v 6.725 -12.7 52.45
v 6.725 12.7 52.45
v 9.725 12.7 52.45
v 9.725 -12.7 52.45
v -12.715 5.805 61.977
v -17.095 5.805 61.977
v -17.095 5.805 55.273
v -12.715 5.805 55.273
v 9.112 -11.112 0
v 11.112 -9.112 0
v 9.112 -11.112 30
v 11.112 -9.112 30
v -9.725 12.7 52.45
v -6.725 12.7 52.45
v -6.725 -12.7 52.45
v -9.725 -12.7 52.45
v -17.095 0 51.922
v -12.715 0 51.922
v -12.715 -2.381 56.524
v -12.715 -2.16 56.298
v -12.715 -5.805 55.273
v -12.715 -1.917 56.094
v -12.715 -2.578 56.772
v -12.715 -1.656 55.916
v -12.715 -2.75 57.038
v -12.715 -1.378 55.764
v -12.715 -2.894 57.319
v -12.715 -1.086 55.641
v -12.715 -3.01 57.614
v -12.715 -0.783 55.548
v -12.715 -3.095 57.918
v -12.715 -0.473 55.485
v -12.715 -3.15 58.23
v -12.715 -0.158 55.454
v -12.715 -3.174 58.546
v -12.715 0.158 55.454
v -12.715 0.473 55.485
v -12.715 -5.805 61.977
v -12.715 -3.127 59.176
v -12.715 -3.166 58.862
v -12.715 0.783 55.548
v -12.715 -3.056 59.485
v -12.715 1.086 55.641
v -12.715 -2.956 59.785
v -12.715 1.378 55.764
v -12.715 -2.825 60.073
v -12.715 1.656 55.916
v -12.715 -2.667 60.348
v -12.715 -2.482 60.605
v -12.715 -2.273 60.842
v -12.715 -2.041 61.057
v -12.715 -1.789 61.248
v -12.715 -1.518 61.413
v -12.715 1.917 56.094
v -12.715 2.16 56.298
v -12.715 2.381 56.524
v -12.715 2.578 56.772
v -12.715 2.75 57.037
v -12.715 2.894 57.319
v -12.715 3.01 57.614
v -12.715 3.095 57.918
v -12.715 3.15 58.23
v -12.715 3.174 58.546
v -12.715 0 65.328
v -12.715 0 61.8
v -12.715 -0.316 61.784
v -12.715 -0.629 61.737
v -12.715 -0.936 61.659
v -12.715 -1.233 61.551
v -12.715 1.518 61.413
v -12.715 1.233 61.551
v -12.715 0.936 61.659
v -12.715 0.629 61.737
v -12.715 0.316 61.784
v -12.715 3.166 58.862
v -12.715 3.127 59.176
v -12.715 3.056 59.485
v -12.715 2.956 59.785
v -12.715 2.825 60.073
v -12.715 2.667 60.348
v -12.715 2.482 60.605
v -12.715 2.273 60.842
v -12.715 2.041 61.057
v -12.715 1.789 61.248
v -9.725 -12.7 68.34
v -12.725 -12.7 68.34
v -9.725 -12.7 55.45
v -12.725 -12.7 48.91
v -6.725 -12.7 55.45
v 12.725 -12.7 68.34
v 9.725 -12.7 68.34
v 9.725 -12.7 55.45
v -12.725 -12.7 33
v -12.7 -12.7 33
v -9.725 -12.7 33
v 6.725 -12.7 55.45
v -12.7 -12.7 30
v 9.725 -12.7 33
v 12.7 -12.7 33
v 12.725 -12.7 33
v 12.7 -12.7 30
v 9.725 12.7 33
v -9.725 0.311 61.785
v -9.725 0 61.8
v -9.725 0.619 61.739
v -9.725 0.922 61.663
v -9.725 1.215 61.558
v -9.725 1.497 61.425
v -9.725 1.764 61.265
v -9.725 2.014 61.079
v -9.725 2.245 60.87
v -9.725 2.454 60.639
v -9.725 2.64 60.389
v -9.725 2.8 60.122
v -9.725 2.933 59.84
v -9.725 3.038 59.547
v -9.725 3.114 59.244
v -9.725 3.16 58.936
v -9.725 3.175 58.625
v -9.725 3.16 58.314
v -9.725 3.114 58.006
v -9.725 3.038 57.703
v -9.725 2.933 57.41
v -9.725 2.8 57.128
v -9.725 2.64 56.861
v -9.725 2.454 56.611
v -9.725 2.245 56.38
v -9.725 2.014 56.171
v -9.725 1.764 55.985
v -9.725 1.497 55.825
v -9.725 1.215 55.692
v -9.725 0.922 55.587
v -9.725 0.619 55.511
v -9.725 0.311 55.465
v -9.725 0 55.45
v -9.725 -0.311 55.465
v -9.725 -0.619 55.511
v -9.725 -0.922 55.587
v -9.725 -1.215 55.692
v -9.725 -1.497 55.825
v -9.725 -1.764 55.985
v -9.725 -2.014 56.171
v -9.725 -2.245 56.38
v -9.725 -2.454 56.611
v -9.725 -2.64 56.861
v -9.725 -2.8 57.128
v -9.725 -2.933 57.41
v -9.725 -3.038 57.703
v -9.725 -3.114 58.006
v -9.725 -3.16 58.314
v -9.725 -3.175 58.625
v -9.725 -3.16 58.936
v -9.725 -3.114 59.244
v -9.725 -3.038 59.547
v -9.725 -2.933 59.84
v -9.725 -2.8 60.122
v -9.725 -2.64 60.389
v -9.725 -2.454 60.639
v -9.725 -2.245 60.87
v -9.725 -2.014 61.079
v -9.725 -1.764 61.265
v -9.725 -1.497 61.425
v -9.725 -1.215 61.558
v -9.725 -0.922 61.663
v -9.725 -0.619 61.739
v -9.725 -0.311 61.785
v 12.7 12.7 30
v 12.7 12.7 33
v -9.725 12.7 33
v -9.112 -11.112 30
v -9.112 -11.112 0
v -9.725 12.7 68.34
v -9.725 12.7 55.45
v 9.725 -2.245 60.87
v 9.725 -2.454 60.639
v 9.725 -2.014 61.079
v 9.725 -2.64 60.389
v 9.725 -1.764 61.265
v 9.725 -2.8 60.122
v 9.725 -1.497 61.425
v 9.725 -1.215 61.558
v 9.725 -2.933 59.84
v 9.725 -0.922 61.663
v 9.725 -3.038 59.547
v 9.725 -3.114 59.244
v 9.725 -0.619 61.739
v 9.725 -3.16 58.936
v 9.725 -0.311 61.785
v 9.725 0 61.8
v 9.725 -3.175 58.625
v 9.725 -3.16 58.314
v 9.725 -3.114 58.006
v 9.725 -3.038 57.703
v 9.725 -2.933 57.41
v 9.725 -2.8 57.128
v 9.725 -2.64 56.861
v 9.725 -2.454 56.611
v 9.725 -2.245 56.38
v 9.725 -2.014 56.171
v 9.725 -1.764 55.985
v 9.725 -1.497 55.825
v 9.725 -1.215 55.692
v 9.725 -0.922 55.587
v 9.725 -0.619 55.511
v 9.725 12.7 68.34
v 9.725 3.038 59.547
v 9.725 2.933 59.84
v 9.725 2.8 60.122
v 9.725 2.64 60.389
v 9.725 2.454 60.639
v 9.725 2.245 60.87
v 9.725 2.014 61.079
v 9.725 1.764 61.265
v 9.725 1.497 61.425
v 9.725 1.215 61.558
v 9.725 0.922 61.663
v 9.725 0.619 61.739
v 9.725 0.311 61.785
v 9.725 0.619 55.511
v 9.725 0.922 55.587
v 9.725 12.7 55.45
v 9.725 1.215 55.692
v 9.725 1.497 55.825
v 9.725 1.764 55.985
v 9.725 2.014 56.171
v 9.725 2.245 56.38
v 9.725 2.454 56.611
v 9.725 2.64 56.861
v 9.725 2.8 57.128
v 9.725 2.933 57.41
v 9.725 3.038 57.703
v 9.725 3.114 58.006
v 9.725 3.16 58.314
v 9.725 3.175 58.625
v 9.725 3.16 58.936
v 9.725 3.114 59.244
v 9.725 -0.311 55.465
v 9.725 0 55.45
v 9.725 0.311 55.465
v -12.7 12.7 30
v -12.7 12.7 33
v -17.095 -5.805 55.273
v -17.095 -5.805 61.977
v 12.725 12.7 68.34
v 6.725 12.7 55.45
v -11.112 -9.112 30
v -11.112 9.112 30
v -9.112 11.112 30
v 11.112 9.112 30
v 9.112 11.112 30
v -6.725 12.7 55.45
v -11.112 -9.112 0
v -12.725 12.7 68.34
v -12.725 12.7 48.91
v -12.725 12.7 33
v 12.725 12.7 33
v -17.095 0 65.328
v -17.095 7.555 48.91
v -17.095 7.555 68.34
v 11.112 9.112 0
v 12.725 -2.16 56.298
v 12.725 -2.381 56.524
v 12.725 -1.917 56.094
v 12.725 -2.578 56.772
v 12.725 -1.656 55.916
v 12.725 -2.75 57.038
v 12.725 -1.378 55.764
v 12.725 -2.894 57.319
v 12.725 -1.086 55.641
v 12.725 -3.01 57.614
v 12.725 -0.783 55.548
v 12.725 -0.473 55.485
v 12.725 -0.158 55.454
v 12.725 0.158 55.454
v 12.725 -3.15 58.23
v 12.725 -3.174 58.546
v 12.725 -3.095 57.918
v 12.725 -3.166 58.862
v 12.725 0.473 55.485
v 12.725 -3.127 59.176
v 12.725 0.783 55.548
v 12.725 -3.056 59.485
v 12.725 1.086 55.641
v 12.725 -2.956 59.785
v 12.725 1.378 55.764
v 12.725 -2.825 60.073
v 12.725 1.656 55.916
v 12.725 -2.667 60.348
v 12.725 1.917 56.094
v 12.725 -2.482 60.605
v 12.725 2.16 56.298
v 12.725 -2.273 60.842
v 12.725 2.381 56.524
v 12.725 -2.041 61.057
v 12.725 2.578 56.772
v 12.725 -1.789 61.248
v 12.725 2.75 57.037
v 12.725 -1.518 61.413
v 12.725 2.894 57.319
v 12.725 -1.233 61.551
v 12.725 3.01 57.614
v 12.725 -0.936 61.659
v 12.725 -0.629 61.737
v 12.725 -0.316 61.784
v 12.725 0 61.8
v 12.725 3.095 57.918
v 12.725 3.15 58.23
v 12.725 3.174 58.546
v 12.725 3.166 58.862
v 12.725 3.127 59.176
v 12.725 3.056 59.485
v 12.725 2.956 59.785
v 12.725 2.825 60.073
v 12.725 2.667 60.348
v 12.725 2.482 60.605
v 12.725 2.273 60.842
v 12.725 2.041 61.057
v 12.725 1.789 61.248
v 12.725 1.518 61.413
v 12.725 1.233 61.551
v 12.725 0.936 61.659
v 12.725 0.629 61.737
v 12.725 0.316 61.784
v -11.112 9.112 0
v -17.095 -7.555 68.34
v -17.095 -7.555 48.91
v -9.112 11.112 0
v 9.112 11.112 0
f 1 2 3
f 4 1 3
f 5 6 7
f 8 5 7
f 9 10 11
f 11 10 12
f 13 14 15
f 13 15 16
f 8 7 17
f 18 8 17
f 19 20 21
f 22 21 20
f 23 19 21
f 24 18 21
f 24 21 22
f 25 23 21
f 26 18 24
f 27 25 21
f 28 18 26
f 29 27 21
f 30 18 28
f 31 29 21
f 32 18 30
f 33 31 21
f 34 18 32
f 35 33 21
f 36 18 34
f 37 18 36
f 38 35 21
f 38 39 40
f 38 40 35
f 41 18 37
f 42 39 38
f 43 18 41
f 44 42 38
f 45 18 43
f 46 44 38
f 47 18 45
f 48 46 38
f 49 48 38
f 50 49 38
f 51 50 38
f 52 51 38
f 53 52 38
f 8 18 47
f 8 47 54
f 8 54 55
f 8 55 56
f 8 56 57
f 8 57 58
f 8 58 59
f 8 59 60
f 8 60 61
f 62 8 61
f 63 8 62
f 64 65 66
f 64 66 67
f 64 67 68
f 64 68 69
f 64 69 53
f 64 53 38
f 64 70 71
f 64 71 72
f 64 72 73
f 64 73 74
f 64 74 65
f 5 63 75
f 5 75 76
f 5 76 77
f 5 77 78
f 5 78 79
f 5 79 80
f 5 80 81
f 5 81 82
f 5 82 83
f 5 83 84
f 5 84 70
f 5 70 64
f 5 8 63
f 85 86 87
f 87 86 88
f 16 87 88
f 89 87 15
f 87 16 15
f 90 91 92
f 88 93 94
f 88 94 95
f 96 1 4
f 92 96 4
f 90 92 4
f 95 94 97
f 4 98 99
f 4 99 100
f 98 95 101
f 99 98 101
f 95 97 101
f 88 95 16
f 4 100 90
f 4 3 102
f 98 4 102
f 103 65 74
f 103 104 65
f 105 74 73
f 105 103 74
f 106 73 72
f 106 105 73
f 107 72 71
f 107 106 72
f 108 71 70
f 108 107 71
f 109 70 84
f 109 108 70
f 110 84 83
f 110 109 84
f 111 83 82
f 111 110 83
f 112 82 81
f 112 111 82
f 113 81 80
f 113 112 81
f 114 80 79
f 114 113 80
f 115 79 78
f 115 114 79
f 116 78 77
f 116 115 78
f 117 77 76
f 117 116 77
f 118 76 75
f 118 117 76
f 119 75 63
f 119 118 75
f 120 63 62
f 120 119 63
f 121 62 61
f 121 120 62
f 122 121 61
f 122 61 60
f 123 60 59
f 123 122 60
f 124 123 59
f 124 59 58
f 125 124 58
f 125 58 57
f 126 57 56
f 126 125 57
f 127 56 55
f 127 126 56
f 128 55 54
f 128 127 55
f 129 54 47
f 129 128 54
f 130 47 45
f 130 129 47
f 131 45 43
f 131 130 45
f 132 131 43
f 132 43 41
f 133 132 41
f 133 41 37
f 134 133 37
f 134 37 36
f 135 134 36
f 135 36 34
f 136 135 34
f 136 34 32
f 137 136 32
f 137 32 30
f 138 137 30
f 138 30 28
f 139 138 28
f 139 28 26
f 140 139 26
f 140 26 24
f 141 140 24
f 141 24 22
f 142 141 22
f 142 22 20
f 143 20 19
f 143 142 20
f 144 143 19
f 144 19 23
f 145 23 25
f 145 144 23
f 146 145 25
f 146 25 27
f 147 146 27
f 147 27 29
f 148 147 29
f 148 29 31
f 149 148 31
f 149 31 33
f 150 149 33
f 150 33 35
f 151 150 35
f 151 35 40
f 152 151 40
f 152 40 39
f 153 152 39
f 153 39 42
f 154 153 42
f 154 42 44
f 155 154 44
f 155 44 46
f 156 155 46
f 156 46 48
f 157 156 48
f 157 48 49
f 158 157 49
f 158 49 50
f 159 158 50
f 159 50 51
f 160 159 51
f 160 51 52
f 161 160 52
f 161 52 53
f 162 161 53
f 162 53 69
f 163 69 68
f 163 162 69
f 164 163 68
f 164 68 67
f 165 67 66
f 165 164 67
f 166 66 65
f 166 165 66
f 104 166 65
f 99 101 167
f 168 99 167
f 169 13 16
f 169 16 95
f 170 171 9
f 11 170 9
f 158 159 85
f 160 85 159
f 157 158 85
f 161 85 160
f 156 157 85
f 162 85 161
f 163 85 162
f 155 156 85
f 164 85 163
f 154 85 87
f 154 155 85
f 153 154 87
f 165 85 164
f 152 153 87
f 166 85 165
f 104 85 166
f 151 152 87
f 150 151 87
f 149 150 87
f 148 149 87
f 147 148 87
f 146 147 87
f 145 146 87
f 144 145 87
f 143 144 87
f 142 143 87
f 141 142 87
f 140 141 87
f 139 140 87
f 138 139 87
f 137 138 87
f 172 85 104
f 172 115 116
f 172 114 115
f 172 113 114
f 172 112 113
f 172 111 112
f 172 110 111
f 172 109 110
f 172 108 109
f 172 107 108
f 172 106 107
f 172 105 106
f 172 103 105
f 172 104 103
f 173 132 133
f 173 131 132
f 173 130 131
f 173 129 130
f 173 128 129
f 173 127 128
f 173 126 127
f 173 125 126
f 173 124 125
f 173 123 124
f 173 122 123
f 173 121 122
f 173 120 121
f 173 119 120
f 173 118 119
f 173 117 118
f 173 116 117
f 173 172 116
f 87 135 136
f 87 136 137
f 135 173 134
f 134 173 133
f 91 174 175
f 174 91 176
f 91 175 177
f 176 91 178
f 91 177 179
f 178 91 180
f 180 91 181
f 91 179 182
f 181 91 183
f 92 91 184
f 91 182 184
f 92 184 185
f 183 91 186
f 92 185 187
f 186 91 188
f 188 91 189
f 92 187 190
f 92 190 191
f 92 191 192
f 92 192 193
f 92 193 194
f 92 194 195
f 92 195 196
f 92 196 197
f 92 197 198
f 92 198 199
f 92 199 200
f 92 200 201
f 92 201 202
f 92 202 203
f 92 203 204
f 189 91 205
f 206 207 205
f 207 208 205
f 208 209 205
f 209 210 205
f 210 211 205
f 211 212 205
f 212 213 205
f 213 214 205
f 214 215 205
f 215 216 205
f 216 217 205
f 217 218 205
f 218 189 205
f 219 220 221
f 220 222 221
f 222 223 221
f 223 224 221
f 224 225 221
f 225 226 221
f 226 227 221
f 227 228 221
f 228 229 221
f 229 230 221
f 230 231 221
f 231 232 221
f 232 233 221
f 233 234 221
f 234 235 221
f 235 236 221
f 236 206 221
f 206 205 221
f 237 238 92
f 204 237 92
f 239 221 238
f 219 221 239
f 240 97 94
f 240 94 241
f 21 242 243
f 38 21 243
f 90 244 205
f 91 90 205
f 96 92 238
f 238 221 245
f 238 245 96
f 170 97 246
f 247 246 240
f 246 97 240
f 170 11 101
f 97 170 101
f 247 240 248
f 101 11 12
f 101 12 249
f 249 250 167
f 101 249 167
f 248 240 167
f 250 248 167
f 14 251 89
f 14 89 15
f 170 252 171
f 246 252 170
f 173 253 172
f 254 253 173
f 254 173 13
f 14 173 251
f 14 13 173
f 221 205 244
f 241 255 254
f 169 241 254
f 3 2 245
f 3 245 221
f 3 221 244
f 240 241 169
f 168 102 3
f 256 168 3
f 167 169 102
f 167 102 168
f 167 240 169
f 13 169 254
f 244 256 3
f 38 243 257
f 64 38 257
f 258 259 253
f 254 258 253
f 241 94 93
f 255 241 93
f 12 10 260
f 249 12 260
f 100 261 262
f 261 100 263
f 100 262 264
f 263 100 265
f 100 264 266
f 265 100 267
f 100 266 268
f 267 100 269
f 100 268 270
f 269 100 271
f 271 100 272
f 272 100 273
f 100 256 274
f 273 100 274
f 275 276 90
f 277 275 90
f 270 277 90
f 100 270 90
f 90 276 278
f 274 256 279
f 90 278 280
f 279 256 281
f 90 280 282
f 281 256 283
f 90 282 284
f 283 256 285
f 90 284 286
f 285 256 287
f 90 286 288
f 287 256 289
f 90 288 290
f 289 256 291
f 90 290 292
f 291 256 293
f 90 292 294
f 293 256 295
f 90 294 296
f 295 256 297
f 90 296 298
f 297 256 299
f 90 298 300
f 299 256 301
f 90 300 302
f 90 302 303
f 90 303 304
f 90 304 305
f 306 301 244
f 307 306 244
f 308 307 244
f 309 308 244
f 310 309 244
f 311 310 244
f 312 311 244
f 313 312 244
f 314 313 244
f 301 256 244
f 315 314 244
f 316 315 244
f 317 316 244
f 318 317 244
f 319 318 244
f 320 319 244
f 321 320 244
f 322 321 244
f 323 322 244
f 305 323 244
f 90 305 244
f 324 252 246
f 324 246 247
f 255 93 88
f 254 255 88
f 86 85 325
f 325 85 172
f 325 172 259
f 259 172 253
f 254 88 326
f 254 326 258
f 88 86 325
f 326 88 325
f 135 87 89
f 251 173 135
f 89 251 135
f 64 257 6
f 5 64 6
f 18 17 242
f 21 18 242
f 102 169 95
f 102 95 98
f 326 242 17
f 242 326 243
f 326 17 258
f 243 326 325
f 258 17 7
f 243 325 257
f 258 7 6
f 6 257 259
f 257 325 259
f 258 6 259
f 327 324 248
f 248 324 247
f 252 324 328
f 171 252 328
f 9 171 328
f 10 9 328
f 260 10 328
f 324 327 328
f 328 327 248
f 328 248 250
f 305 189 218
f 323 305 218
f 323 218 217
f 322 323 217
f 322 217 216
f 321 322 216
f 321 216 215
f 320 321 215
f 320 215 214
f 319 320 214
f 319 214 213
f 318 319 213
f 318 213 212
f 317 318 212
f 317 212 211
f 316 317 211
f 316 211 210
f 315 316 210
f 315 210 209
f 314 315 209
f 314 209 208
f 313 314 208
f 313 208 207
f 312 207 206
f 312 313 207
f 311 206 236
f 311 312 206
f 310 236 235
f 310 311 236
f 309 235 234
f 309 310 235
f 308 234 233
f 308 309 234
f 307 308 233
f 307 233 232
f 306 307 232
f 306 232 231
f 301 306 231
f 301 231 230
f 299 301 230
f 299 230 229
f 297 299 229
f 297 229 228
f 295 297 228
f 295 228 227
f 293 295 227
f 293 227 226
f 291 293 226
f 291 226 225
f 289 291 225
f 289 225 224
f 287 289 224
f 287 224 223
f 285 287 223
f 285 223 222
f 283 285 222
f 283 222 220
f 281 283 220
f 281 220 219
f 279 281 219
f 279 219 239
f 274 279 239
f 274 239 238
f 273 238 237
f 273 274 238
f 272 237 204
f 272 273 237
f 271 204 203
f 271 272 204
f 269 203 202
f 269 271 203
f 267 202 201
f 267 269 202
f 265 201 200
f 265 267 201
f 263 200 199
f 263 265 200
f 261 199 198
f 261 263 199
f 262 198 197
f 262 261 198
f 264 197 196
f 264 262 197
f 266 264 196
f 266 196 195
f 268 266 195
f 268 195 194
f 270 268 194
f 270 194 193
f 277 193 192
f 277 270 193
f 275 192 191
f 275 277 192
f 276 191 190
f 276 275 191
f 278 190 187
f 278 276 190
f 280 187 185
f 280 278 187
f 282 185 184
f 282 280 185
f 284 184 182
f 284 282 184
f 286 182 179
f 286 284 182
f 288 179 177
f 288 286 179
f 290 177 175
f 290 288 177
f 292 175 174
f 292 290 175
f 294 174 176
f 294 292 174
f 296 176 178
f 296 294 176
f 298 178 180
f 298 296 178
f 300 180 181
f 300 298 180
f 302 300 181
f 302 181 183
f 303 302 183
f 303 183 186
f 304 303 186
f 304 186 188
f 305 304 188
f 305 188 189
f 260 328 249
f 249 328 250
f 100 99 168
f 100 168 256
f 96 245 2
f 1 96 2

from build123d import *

# Parameters (mm, degrees)
SKETCH1_W               = 22.225
SKETCH1_H               = 22.225
BOSS_EXTRUDE1_DEPTH     = 30
SKETCH3_W               = 25.4
SKETCH3_H               = 25.4
BOSS_EXTRUDE2_DEPTH     = 3
BOSS_EXTRUDE3_DEPTH     = 25.4
BOSS_EXTRUDE4_DEPTH     = 19.43
CUT_EXTRUDE1_DEPTH      = 75.504751526
CUT_EXTRUDE1_DEPTH_BACK = 75.504751526
SKETCH5_R               = 3.175
CUT_EXTRUDE2_DEPTH      = 4.38
CHAMFER1_SIZE           = 2


with BuildPart() as part:
    # Sketch1 → Boss-Extrude1 (new body)
    with BuildSketch(Plane.XY):
        Rectangle(SKETCH1_W, SKETCH1_H)
    extrude(amount=BOSS_EXTRUDE1_DEPTH)

    # Sketch3 → Boss-Extrude2 (add)
    with BuildSketch(Plane.XY.offset(30)):
        Rectangle(SKETCH3_W, SKETCH3_H)
    extrude(amount=BOSS_EXTRUDE2_DEPTH)

    # Sketch4 → Boss-Extrude3 (add)
    with BuildSketch(Plane(origin=(0, 12.7, 0), x_dir=(1, 0, 0), z_dir=(0, 1, 0))):
        Polygon((-12.725, -33), (-12.725, -68.34), (-9.725, -68.34), (-9.725, -55.45), (-6.725, -55.45), (-6.725, -52.45), (-9.725, -52.45), (-9.725, -33), align=None)
        Polygon((9.725, -33), (12.725, -33), (12.725, -68.34), (9.725, -68.34), (9.725, -55.45), (6.725, -55.45), (6.725, -52.45), (9.725, -52.45), align=None)
    extrude(amount=-BOSS_EXTRUDE3_DEPTH)

    # Sketch6 → Boss-Extrude4 (add)
    with BuildSketch(Plane.XY.offset(68.34)):
        Polygon((-12.725, -12.7), (-17.095, -7.555), (-17.095, 7.555), (-12.725, 12.7), align=None)
    extrude(amount=-BOSS_EXTRUDE4_DEPTH)

    # Sketch5 → Cut-Extrude1 (cut, two sides: drawn at the far end of the back side and taken through both)
    with BuildSketch(Plane.ZY.offset(-9.725).offset(-CUT_EXTRUDE1_DEPTH_BACK)):
        with Locations((58.625, 0)):
            Circle(SKETCH5_R)
    extrude(amount=CUT_EXTRUDE1_DEPTH + CUT_EXTRUDE1_DEPTH_BACK, mode=Mode.SUBTRACT)

    # Sketch7 → Cut-Extrude2 (cut)
    with BuildSketch(Plane.ZY.offset(17.095)):
        Polygon((61.976518313, 5.805), (55.273481687, 5.805), (51.921963375, 0), (55.273481687, -5.805), (61.976518313, -5.805), (65.328036625, 0), align=None)
    extrude(amount=-CUT_EXTRUDE2_DEPTH, mode=Mode.SUBTRACT)

    # Chamfer1
    chamfer1_edges = [part.edges().sort_by_distance(p)[0] for p in [
        (11.1125, -11.1125, 15),
        (-11.1125, -11.1125, 15),
        (-11.1125, 11.1125, 15),
        (11.1125, 11.1125, 15),
    ]]
    chamfer(chamfer1_edges, length=CHAMFER1_SIZE)


solid = part.part
